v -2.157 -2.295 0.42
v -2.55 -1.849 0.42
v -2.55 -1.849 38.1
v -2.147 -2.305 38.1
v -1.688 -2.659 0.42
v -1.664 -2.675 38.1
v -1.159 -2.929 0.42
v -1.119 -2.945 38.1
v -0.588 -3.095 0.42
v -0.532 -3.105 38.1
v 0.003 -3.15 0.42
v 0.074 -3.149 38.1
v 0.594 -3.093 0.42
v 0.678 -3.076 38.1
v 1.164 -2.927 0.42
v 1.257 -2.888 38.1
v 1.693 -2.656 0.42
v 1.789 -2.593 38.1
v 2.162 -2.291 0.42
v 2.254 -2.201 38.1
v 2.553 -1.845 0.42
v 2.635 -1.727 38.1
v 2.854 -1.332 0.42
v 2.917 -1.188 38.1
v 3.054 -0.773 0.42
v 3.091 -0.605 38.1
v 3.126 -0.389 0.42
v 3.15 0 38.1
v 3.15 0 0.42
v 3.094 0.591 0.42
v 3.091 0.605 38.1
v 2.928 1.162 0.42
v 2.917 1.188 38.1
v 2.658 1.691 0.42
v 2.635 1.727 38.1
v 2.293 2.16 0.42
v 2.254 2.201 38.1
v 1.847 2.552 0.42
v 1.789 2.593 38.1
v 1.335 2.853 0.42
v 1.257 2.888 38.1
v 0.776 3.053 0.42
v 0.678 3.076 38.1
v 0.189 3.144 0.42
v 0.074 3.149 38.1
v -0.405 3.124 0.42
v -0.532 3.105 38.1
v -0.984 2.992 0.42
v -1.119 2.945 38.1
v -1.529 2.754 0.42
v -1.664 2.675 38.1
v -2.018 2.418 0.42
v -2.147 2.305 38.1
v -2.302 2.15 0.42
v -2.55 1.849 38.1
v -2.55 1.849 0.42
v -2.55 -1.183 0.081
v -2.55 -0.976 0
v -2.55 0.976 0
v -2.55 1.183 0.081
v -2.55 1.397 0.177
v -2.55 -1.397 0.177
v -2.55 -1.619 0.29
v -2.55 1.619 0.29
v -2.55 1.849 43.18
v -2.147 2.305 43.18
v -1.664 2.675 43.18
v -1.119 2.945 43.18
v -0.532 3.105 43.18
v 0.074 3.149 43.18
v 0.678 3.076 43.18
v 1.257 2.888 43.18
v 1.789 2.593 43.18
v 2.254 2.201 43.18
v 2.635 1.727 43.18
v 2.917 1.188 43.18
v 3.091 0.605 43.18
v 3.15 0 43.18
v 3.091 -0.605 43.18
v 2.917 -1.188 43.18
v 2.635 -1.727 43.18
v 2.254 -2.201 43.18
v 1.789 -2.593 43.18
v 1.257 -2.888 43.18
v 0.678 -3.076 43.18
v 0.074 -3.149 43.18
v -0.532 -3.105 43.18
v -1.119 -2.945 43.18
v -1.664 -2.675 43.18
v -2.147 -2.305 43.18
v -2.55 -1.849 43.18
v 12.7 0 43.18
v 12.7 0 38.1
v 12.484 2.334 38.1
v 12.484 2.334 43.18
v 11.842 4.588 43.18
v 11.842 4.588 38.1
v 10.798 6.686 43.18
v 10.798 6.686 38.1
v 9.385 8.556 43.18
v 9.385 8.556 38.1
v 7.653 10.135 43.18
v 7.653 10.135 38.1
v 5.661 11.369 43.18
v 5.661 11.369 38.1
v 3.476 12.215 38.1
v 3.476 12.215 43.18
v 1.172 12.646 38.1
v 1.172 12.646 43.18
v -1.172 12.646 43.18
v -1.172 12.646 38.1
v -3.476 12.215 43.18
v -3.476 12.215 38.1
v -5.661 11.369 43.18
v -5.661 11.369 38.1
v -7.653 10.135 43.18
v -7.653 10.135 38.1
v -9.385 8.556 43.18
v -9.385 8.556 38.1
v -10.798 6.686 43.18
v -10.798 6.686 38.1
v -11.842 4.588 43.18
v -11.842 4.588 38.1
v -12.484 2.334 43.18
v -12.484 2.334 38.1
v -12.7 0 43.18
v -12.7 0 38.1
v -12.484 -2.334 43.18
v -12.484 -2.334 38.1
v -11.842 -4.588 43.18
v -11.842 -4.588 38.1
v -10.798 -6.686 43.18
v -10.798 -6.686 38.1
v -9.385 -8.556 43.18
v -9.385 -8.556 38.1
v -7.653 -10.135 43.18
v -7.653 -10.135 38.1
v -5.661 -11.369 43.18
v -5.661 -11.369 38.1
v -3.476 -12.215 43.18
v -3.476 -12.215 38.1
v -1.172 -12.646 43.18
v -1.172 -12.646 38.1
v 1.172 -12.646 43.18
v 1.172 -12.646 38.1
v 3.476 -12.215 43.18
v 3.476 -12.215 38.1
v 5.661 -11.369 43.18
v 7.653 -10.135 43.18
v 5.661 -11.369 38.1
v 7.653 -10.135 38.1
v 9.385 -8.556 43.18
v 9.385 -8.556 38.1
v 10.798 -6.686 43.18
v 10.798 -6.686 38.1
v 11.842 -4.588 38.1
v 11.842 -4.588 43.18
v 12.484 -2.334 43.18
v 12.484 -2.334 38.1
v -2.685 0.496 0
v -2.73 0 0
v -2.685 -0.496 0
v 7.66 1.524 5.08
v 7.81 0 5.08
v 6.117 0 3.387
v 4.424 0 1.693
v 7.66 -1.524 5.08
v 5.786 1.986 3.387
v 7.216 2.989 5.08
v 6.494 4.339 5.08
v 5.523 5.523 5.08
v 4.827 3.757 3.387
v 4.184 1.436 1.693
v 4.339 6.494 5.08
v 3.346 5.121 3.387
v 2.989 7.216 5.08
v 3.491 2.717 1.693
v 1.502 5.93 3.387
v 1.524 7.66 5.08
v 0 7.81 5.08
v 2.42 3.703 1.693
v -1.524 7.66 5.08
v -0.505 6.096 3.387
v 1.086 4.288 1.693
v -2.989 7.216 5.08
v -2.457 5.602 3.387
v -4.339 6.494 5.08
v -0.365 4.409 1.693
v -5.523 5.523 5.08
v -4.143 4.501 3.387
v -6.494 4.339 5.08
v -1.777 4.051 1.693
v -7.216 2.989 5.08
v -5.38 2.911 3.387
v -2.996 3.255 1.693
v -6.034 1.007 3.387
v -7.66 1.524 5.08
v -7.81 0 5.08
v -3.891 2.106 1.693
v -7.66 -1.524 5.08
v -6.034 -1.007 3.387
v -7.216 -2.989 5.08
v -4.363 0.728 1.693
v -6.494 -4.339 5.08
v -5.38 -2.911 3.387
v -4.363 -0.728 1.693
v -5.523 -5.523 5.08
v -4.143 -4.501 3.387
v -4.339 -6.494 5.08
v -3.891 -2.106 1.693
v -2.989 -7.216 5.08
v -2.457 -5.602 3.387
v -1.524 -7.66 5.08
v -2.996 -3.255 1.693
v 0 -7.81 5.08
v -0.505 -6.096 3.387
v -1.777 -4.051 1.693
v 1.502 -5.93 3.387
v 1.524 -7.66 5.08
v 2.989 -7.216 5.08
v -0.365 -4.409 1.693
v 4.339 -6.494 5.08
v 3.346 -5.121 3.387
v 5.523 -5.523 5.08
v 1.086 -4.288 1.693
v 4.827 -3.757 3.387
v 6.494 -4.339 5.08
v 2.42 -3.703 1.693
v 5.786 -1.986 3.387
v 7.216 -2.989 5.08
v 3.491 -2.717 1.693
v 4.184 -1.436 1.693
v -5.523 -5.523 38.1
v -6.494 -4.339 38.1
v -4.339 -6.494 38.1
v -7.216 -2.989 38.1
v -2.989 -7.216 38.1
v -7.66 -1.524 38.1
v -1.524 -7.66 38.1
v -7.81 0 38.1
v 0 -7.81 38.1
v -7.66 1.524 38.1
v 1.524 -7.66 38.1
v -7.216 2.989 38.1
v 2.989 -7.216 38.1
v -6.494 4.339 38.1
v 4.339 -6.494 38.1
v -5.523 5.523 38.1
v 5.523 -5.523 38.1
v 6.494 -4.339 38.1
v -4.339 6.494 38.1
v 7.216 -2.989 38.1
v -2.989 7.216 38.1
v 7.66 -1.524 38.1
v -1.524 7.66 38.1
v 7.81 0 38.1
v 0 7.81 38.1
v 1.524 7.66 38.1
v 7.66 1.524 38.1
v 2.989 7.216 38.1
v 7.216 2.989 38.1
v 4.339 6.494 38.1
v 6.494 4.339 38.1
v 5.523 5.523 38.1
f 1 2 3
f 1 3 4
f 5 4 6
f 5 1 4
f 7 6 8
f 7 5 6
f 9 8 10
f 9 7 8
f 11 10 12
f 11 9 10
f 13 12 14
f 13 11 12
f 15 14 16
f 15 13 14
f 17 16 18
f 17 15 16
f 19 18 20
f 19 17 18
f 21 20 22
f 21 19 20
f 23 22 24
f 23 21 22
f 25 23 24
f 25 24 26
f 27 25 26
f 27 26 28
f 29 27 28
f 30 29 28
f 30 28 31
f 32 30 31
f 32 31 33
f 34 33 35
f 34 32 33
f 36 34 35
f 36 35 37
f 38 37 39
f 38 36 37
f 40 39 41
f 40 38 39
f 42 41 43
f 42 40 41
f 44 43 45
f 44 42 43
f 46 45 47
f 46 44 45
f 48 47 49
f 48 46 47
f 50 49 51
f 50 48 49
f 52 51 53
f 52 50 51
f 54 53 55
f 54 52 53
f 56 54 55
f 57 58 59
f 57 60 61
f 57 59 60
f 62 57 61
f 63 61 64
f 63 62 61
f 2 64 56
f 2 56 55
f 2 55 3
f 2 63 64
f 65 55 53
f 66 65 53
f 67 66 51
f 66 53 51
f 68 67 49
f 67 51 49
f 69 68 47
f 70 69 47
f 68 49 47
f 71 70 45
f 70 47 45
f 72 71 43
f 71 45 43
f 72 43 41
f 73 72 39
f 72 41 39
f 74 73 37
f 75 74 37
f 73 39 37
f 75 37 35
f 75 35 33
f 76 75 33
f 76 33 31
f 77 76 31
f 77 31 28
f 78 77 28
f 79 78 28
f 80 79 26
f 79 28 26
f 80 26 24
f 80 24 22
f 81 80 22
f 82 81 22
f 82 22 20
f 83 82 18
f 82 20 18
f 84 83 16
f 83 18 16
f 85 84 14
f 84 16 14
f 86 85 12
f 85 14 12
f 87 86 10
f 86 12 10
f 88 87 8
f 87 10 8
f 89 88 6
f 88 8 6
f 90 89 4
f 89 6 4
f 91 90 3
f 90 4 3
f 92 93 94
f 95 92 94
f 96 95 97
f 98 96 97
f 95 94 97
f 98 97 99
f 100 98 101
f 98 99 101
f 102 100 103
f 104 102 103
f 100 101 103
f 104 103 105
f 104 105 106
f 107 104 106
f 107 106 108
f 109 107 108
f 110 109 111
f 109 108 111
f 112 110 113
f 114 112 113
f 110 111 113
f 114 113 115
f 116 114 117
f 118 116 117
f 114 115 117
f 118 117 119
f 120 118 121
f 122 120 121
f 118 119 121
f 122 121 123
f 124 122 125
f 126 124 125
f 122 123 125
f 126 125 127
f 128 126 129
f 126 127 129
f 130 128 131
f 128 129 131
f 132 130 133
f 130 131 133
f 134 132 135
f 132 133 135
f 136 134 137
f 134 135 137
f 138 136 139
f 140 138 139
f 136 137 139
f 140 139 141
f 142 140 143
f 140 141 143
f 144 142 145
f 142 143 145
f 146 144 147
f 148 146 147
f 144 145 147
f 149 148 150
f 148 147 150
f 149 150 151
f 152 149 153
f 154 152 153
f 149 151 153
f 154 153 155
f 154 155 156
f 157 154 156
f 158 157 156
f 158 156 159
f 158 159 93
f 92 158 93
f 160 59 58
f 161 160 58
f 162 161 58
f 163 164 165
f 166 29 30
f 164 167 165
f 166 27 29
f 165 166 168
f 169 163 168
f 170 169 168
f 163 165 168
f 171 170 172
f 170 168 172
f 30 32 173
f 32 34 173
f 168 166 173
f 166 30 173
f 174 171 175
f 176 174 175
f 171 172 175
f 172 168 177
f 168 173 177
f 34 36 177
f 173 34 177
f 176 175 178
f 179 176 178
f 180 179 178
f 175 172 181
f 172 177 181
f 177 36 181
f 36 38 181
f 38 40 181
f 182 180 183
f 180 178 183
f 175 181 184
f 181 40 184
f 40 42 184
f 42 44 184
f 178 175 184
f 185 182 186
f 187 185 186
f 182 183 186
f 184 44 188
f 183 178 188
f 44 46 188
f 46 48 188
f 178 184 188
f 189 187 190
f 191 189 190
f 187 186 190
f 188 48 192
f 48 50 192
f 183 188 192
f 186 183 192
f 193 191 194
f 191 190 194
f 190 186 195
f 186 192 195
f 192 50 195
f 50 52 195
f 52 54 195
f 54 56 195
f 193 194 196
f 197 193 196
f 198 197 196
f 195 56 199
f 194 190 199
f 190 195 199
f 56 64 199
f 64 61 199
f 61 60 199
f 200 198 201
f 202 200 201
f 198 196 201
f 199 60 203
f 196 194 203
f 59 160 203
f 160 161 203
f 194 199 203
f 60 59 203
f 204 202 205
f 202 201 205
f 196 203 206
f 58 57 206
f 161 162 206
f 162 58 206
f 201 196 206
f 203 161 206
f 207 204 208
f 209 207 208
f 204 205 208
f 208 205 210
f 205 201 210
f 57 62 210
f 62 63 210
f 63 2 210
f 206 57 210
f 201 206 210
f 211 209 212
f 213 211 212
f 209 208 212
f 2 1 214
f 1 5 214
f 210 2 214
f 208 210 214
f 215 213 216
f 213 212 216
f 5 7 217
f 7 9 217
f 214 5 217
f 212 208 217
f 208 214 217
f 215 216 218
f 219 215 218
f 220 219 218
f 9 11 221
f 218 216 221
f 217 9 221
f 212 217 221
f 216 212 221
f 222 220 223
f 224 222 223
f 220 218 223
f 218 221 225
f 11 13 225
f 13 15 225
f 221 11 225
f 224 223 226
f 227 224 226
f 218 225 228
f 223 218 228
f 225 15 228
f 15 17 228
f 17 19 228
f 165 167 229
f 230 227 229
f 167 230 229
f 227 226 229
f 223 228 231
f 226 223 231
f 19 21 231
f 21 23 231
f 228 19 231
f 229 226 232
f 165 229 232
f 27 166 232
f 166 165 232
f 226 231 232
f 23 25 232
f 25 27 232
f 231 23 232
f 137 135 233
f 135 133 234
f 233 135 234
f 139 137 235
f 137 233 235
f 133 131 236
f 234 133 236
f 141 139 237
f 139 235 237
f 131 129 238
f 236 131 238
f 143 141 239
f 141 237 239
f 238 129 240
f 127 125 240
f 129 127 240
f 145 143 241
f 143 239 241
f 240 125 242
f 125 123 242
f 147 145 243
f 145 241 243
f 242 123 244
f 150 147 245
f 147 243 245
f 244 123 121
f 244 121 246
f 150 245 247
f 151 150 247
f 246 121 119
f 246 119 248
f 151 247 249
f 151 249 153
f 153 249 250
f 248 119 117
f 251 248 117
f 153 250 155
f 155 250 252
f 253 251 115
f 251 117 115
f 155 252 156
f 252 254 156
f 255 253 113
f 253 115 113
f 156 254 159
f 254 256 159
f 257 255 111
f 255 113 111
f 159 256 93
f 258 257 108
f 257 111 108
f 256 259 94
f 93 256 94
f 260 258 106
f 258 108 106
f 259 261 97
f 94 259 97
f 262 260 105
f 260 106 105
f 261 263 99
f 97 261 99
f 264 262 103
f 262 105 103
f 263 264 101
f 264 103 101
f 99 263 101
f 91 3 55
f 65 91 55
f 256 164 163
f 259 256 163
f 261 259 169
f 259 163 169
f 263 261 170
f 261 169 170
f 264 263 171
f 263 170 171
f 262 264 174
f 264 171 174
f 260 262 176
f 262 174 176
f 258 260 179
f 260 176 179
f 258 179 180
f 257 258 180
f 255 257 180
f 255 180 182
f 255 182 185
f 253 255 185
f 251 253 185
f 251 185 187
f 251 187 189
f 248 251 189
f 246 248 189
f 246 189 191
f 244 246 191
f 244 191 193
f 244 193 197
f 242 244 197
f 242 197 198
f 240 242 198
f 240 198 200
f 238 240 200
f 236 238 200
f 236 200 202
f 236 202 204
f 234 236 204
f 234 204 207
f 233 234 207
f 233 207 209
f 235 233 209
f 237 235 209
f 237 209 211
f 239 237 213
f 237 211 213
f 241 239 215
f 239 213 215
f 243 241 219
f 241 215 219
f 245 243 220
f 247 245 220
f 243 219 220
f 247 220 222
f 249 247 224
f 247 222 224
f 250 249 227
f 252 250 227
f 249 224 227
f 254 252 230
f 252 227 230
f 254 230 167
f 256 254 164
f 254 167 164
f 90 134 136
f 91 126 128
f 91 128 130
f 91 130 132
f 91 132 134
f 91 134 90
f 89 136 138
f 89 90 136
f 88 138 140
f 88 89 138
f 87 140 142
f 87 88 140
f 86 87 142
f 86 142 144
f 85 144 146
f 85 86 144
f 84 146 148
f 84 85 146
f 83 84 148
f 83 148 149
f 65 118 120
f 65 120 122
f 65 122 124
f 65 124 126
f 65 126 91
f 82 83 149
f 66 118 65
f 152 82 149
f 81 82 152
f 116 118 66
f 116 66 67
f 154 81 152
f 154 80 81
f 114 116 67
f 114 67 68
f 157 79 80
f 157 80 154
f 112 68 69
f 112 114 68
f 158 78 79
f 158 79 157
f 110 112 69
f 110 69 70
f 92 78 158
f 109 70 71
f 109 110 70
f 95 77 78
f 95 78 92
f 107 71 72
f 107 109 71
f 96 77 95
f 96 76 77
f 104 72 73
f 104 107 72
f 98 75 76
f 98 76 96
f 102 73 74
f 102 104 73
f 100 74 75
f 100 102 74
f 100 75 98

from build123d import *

# Parameters (mm, degrees)
F1_R     = 7.8105
F2_DEPTH = 38.1
F3_DEPTH = 50.8
F4_R     = 12.7
F4_R_2   = 7.8105
F5_DEPTH = 5.08


# Not quite as in the source:
# - a fillet or chamfer that OpenCascade refuses, or shapes differently, is made with other operations: its cross-section is extruded or revolved along the edge and cut away or added


with BuildPart() as f2:
    # F1 (on Top) → F2 (new body)
    with BuildSketch(Plane.XY):
        Circle(F1_R)
    extrude(amount=F2_DEPTH)

    # F0 (on Top) → F3 (cut)
    with BuildSketch(Plane.XY):
        with BuildLine():
            Line((-2.55, 1.8493242009), (-2.55, -1.8493242009))
            ThreePointArc((-2.55, -1.8493242009), (3.15, 0), (-2.55, 1.8493242009))
        make_face()
    extrude(amount=F3_DEPTH, mode=Mode.SUBTRACT)

    # F4 (on face) → F5 (join)
    with BuildSketch(Plane.XY.offset(38.1)):
        Circle(F4_R)
        Circle(F4_R_2, mode=Mode.SUBTRACT)
        Circle(F4_R_2)
        with BuildLine():
            Line((-2.55, -1.8493242009), (-2.55, 1.8493242009))
            ThreePointArc((-2.55, 1.8493242009), (3.15, 0), (-2.55, -1.8493242009))
        make_face(mode=Mode.SUBTRACT)
    extrude(amount=F5_DEPTH)

    # F6: chamfer of 5.08 on 1 edges, made by hand

    # F6_s1 → F6_t2 (revolve, cut)
    with BuildSketch(Plane.XZ):
        Polygon((7.8105, 5.08), (2.7305, 0), (7.8105, 0), align=None)
    revolve(axis=Axis((0, 0, 0), (0, 0, 1)), mode=Mode.SUBTRACT)


solid = f2.part
